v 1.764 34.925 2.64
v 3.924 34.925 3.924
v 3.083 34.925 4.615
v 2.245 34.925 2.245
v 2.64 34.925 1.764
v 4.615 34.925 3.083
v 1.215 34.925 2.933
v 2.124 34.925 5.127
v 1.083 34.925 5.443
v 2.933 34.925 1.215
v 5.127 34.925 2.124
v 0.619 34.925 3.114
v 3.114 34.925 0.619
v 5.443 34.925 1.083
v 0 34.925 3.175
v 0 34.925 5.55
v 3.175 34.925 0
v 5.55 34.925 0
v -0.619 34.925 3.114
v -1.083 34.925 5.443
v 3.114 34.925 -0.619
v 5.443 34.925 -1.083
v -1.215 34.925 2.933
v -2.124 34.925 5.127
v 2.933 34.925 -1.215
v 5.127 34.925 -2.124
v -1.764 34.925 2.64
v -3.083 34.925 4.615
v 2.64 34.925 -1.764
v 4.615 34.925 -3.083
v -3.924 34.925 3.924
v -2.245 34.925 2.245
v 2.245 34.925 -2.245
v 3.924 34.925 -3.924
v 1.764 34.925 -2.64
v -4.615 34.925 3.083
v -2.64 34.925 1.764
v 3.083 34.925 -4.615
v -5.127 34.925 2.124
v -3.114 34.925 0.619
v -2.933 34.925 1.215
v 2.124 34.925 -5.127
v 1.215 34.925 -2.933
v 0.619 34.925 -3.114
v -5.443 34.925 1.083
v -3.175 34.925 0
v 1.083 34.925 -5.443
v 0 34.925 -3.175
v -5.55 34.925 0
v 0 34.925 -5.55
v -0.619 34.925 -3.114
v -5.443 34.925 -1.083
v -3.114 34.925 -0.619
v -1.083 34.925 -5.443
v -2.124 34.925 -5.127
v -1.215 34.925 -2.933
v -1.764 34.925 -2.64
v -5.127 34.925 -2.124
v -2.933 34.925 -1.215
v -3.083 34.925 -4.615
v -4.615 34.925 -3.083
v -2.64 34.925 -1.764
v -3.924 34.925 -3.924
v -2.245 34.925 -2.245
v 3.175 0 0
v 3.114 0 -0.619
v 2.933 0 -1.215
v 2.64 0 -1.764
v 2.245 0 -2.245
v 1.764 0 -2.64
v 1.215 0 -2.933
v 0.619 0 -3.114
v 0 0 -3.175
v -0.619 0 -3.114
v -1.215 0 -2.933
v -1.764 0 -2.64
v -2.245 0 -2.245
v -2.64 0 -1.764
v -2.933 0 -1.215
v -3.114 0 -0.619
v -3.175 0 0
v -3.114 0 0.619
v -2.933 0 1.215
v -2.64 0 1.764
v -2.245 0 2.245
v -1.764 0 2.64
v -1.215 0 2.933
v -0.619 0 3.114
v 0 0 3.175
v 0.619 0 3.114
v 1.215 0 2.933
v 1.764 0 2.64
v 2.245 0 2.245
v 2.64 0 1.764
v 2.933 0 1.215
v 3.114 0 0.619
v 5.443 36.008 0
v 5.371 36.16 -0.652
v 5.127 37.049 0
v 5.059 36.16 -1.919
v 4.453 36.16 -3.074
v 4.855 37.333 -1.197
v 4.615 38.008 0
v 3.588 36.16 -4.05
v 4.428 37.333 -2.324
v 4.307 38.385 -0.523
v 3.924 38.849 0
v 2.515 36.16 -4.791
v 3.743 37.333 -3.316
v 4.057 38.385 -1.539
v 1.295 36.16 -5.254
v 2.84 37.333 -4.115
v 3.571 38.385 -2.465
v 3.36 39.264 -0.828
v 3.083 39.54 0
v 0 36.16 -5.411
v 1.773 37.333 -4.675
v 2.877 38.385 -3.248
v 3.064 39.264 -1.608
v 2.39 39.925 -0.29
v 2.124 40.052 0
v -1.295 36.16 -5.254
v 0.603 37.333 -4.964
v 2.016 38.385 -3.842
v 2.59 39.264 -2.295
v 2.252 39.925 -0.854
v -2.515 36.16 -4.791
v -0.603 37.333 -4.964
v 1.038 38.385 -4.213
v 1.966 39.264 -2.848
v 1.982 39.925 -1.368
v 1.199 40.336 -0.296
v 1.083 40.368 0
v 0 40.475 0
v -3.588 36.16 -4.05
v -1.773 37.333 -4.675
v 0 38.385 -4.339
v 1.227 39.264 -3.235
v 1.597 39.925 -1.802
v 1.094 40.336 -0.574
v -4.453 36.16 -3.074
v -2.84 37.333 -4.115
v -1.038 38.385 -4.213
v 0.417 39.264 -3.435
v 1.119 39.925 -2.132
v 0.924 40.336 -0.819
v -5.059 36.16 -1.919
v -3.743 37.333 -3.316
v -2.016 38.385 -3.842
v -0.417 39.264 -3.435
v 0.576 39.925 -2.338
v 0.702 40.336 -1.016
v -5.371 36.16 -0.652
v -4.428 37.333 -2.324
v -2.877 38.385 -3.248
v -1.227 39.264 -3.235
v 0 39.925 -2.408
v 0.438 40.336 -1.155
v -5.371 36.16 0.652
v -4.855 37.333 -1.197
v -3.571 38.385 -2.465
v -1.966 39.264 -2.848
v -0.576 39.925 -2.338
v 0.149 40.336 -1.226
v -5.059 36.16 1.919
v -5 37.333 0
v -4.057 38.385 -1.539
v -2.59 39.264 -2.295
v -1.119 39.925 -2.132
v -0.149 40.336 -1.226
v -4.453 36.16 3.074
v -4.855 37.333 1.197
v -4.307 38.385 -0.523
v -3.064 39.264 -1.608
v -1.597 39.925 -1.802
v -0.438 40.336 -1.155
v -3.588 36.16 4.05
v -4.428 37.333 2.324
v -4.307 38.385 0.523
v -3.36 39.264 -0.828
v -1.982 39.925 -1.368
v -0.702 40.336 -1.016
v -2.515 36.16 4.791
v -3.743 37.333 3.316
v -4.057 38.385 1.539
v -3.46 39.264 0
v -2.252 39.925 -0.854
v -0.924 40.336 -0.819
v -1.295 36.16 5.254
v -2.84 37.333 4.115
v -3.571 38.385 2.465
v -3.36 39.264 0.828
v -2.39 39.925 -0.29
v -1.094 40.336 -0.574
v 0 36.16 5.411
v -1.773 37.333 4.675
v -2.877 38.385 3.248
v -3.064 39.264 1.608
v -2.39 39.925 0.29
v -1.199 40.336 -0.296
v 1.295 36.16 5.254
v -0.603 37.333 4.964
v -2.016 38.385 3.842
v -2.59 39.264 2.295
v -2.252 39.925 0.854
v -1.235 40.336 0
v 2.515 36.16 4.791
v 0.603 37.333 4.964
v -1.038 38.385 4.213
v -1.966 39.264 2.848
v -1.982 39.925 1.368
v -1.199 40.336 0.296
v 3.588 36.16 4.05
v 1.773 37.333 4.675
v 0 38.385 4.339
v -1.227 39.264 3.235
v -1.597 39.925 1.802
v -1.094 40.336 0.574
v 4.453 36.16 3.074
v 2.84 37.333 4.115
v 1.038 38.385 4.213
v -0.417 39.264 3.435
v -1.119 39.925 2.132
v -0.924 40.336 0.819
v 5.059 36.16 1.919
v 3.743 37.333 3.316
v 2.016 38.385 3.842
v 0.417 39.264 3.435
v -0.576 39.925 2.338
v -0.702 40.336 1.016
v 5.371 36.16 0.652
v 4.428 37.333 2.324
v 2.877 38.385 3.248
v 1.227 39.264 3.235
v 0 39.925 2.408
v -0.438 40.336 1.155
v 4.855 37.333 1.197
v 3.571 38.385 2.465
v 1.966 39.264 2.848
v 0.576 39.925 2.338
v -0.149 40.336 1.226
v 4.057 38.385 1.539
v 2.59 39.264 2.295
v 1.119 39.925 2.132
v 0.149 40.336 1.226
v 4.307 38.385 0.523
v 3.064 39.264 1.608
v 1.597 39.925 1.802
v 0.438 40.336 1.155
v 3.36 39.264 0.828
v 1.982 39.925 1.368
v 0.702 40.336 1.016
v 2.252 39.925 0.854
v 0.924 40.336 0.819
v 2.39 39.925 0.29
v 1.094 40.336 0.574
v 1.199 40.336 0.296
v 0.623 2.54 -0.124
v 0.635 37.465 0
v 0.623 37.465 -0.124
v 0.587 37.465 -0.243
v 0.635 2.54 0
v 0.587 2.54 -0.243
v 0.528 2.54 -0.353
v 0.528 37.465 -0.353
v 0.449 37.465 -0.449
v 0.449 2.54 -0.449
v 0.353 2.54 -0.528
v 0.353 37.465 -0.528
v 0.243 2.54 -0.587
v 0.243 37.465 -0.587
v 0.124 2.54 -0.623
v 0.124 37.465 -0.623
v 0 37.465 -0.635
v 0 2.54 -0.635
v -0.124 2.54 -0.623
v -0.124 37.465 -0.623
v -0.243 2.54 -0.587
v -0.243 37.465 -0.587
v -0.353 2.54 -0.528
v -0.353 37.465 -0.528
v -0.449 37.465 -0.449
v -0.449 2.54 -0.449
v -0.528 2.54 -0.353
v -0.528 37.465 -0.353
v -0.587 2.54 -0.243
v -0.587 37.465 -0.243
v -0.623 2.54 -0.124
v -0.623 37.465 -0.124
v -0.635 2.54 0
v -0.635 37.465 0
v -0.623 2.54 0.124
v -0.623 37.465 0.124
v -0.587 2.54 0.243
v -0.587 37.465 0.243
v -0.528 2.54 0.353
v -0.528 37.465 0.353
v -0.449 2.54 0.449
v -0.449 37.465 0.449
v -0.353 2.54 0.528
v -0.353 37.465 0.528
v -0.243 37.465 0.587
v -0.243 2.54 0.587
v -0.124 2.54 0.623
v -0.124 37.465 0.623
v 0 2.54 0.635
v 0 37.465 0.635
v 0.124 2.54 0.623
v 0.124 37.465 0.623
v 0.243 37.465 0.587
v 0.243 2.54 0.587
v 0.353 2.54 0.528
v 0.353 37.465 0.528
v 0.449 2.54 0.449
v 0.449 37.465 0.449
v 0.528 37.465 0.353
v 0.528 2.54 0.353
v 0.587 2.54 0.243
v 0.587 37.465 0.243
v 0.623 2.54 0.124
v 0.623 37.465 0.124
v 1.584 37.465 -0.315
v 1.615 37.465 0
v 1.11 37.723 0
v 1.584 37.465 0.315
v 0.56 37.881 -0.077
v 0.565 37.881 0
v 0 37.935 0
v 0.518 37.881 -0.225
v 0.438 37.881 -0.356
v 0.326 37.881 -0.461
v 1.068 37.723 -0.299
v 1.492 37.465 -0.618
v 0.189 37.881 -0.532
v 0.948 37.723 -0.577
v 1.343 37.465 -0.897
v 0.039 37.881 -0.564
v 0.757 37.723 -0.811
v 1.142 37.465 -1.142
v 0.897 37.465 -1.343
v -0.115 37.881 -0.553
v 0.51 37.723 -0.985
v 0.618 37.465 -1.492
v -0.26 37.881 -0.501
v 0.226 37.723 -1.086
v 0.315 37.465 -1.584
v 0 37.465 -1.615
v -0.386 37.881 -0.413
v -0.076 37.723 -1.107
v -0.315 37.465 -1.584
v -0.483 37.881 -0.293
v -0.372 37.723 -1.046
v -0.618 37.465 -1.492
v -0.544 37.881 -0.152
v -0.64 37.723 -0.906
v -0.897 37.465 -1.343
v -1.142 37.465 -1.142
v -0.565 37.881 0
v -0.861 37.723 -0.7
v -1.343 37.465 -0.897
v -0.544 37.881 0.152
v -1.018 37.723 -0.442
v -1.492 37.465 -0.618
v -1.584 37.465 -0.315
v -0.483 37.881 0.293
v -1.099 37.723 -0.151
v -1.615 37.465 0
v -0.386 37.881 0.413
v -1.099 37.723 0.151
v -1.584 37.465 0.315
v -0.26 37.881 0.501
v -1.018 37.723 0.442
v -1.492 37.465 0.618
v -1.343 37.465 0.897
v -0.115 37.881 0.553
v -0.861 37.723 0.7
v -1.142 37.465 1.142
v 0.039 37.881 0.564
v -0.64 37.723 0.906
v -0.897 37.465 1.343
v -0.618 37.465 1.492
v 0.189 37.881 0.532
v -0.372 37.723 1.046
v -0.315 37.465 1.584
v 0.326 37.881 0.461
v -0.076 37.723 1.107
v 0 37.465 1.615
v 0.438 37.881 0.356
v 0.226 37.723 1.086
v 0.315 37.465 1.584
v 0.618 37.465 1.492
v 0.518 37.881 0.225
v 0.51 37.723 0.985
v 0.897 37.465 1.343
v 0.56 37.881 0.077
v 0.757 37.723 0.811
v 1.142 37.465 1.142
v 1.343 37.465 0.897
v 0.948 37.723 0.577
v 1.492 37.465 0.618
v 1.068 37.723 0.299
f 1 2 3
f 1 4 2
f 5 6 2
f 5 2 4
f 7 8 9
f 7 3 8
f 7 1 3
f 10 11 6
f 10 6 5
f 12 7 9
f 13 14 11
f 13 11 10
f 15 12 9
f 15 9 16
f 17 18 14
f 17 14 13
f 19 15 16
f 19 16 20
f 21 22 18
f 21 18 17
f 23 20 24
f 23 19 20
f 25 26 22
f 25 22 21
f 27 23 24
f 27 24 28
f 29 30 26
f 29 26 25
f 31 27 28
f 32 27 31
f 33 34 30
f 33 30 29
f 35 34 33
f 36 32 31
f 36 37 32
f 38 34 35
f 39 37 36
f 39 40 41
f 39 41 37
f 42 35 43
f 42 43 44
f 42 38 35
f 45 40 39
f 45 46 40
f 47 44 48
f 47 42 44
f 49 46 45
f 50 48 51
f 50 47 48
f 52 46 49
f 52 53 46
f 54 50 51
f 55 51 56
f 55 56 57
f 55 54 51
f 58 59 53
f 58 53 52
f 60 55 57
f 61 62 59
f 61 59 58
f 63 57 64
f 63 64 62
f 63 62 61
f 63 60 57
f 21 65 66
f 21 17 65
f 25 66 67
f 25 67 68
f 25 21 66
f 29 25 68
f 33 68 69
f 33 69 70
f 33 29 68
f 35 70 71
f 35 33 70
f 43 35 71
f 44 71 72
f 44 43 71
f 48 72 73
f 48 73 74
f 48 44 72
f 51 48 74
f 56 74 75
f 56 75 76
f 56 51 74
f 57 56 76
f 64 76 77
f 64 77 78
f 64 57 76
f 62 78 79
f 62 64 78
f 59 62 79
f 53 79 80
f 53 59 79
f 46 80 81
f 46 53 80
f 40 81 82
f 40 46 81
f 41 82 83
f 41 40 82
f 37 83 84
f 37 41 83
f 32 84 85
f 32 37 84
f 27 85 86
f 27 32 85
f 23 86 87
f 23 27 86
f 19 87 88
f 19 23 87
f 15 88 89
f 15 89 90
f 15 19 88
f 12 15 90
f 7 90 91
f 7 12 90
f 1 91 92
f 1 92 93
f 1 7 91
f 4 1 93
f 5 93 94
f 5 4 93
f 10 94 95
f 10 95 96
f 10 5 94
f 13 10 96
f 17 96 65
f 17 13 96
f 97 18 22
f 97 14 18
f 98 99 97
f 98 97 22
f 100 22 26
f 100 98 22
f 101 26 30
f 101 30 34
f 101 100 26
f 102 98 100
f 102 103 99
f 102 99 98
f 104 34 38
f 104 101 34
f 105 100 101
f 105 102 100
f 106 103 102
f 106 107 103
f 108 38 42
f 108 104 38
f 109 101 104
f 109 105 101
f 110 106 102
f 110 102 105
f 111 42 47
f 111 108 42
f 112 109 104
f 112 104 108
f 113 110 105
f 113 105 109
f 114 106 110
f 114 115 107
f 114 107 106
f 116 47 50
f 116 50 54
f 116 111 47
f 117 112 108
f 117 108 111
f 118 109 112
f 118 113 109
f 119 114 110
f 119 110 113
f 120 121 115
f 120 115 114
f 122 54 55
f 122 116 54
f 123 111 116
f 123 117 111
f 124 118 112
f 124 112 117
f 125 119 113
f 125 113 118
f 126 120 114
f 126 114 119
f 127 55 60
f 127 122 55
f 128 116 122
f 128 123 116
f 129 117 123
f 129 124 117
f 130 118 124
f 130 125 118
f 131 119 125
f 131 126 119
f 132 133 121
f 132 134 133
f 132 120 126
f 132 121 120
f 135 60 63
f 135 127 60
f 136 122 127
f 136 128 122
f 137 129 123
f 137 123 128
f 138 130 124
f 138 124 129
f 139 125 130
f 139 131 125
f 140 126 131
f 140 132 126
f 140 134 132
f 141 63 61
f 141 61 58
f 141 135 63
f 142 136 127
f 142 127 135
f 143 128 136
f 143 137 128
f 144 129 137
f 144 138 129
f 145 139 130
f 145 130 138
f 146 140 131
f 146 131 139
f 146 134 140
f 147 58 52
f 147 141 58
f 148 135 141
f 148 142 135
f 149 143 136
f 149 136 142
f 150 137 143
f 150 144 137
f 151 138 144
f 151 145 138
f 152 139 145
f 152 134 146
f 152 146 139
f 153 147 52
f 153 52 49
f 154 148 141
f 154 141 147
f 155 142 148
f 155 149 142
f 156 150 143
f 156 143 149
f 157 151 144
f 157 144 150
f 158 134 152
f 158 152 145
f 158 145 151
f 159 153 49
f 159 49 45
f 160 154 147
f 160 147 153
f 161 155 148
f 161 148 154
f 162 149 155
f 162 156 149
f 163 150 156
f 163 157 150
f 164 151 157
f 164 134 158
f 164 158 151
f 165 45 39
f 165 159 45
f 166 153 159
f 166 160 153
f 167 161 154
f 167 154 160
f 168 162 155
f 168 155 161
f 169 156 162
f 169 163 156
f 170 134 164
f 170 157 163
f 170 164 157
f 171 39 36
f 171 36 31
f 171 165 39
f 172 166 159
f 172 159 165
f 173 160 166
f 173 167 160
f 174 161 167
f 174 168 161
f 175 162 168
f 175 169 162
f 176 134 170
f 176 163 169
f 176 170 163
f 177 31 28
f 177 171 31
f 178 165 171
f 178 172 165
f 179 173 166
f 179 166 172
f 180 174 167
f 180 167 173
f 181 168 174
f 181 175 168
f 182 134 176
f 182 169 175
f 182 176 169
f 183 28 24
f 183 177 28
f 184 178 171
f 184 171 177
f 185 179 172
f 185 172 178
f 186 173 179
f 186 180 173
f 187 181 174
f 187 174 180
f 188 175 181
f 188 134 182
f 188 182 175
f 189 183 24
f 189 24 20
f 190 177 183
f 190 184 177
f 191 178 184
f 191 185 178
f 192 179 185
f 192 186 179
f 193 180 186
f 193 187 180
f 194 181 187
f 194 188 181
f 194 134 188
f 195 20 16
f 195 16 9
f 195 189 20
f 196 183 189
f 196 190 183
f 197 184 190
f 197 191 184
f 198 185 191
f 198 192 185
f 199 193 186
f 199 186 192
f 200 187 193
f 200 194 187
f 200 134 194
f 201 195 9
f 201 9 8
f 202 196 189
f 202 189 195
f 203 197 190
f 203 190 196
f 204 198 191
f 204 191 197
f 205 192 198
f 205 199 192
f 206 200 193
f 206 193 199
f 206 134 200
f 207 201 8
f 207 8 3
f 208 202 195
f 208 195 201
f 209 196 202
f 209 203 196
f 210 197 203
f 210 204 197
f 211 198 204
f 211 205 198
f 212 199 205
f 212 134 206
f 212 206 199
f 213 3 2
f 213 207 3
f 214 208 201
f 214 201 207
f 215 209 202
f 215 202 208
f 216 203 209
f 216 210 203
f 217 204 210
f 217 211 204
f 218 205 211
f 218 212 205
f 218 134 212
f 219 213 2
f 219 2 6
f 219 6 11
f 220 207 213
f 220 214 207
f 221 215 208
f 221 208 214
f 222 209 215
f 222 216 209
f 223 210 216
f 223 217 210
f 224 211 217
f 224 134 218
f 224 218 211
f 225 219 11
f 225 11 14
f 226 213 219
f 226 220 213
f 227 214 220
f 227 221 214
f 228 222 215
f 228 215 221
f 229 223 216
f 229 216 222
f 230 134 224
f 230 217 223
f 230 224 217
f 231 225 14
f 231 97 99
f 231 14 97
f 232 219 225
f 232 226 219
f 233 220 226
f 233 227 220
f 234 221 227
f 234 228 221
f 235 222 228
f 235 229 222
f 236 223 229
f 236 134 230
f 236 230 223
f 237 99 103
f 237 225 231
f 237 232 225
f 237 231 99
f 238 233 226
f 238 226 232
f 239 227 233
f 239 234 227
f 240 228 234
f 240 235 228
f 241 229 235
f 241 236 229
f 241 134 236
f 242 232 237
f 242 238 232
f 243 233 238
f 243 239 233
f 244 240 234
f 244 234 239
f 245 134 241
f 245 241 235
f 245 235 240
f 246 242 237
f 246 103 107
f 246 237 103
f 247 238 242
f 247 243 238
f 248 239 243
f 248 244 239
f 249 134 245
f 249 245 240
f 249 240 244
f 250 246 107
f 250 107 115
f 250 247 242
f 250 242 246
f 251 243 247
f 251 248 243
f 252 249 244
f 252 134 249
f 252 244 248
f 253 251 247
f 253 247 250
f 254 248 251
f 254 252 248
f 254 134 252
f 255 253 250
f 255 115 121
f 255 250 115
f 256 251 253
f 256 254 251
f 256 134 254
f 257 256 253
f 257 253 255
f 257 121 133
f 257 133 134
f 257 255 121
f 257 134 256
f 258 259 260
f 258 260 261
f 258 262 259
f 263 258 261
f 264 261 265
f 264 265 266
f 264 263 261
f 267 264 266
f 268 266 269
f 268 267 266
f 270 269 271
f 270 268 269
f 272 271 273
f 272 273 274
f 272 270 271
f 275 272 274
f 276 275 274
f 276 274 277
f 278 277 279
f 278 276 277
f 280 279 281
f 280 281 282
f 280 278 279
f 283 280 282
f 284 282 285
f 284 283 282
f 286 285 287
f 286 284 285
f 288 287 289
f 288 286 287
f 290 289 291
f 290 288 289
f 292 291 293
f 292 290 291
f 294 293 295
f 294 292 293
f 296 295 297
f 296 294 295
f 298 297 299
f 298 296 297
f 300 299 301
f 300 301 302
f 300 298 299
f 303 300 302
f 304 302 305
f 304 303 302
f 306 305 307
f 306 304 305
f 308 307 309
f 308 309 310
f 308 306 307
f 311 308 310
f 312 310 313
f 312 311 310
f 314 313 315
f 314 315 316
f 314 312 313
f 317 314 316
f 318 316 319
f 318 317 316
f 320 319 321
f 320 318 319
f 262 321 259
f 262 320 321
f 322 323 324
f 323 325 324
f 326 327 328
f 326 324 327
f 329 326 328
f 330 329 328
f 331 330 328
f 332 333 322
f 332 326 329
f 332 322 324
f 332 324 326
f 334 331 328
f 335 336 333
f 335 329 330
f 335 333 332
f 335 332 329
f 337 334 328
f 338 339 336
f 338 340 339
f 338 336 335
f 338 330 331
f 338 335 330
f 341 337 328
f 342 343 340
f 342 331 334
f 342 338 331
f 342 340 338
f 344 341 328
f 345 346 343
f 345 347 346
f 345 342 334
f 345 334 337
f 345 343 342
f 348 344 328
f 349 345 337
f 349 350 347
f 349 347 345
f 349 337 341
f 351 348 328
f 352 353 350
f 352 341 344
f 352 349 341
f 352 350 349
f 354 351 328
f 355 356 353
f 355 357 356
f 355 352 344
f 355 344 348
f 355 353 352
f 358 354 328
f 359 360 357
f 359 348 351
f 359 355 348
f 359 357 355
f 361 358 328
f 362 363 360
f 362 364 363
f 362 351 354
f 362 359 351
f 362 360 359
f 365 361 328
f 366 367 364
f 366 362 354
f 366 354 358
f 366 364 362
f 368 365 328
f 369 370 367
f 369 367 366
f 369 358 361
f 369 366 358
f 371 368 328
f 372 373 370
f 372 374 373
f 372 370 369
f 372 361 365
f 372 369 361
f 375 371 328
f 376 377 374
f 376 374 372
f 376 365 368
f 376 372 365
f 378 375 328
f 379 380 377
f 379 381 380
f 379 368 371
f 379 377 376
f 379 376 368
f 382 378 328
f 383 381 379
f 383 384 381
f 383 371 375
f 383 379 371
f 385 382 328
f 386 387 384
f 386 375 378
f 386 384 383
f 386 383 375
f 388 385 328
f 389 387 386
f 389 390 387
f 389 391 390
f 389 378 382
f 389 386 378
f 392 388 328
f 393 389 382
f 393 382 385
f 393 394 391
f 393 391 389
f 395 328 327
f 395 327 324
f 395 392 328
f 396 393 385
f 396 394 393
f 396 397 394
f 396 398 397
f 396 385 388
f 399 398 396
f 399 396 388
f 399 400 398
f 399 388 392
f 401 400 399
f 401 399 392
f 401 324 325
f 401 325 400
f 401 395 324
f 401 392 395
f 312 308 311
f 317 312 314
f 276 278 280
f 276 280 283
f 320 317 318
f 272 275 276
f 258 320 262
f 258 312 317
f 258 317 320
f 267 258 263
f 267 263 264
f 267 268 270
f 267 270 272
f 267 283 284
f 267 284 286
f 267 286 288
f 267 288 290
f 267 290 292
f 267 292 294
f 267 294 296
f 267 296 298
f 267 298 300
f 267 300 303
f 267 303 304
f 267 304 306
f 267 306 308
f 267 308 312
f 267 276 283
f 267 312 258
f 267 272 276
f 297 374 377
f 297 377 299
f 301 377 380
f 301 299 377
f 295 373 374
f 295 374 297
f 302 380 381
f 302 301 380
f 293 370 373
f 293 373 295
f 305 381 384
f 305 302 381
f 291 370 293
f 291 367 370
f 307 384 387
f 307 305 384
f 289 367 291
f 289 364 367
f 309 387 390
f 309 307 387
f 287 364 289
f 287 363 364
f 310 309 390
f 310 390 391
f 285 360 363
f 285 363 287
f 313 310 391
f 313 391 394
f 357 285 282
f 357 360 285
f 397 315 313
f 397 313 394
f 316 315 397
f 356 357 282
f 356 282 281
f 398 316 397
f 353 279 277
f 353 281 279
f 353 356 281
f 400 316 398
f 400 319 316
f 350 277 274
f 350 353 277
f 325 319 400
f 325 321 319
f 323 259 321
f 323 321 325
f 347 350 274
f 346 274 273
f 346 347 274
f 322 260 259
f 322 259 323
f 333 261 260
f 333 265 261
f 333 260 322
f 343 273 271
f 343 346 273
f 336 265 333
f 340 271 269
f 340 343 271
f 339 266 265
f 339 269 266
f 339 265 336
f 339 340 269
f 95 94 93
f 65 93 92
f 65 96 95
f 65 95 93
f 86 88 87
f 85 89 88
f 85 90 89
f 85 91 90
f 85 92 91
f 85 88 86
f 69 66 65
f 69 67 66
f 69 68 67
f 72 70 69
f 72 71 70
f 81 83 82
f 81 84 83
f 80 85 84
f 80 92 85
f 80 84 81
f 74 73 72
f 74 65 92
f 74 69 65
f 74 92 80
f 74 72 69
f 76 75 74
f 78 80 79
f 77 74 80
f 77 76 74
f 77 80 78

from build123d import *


with BuildPart() as part:
    # Sketch1 → Revolve-Thin1 (revolve)
    with BuildSketch(Plane.XY):
        with BuildLine():
            Line((0, 0), (3.175, 0))
            Line((3.175, 0), (3.175, 34.925))
            Line((3.175, 34.925), (5.5499, 34.925))
            ThreePointArc((5.5499, 34.925), (3.924371925, 38.849371925), (0, 40.4749))
            Line((0, 40.4749), (0, 37.9349))
            ThreePointArc((0, 37.9349), (0.840937575, 37.815038409), (1.614898762, 37.465))
            Line((1.614898762, 37.465), (0.635, 37.465))
            Line((0.635, 37.465), (0.635, 2.54))
            Line((0.635, 2.54), (0, 2.54))
            Line((0, 2.54), (0, 0))
        make_face()
    revolve(axis=Axis((0, 0, 0), (0, 1, 0)))


solid = part.part
